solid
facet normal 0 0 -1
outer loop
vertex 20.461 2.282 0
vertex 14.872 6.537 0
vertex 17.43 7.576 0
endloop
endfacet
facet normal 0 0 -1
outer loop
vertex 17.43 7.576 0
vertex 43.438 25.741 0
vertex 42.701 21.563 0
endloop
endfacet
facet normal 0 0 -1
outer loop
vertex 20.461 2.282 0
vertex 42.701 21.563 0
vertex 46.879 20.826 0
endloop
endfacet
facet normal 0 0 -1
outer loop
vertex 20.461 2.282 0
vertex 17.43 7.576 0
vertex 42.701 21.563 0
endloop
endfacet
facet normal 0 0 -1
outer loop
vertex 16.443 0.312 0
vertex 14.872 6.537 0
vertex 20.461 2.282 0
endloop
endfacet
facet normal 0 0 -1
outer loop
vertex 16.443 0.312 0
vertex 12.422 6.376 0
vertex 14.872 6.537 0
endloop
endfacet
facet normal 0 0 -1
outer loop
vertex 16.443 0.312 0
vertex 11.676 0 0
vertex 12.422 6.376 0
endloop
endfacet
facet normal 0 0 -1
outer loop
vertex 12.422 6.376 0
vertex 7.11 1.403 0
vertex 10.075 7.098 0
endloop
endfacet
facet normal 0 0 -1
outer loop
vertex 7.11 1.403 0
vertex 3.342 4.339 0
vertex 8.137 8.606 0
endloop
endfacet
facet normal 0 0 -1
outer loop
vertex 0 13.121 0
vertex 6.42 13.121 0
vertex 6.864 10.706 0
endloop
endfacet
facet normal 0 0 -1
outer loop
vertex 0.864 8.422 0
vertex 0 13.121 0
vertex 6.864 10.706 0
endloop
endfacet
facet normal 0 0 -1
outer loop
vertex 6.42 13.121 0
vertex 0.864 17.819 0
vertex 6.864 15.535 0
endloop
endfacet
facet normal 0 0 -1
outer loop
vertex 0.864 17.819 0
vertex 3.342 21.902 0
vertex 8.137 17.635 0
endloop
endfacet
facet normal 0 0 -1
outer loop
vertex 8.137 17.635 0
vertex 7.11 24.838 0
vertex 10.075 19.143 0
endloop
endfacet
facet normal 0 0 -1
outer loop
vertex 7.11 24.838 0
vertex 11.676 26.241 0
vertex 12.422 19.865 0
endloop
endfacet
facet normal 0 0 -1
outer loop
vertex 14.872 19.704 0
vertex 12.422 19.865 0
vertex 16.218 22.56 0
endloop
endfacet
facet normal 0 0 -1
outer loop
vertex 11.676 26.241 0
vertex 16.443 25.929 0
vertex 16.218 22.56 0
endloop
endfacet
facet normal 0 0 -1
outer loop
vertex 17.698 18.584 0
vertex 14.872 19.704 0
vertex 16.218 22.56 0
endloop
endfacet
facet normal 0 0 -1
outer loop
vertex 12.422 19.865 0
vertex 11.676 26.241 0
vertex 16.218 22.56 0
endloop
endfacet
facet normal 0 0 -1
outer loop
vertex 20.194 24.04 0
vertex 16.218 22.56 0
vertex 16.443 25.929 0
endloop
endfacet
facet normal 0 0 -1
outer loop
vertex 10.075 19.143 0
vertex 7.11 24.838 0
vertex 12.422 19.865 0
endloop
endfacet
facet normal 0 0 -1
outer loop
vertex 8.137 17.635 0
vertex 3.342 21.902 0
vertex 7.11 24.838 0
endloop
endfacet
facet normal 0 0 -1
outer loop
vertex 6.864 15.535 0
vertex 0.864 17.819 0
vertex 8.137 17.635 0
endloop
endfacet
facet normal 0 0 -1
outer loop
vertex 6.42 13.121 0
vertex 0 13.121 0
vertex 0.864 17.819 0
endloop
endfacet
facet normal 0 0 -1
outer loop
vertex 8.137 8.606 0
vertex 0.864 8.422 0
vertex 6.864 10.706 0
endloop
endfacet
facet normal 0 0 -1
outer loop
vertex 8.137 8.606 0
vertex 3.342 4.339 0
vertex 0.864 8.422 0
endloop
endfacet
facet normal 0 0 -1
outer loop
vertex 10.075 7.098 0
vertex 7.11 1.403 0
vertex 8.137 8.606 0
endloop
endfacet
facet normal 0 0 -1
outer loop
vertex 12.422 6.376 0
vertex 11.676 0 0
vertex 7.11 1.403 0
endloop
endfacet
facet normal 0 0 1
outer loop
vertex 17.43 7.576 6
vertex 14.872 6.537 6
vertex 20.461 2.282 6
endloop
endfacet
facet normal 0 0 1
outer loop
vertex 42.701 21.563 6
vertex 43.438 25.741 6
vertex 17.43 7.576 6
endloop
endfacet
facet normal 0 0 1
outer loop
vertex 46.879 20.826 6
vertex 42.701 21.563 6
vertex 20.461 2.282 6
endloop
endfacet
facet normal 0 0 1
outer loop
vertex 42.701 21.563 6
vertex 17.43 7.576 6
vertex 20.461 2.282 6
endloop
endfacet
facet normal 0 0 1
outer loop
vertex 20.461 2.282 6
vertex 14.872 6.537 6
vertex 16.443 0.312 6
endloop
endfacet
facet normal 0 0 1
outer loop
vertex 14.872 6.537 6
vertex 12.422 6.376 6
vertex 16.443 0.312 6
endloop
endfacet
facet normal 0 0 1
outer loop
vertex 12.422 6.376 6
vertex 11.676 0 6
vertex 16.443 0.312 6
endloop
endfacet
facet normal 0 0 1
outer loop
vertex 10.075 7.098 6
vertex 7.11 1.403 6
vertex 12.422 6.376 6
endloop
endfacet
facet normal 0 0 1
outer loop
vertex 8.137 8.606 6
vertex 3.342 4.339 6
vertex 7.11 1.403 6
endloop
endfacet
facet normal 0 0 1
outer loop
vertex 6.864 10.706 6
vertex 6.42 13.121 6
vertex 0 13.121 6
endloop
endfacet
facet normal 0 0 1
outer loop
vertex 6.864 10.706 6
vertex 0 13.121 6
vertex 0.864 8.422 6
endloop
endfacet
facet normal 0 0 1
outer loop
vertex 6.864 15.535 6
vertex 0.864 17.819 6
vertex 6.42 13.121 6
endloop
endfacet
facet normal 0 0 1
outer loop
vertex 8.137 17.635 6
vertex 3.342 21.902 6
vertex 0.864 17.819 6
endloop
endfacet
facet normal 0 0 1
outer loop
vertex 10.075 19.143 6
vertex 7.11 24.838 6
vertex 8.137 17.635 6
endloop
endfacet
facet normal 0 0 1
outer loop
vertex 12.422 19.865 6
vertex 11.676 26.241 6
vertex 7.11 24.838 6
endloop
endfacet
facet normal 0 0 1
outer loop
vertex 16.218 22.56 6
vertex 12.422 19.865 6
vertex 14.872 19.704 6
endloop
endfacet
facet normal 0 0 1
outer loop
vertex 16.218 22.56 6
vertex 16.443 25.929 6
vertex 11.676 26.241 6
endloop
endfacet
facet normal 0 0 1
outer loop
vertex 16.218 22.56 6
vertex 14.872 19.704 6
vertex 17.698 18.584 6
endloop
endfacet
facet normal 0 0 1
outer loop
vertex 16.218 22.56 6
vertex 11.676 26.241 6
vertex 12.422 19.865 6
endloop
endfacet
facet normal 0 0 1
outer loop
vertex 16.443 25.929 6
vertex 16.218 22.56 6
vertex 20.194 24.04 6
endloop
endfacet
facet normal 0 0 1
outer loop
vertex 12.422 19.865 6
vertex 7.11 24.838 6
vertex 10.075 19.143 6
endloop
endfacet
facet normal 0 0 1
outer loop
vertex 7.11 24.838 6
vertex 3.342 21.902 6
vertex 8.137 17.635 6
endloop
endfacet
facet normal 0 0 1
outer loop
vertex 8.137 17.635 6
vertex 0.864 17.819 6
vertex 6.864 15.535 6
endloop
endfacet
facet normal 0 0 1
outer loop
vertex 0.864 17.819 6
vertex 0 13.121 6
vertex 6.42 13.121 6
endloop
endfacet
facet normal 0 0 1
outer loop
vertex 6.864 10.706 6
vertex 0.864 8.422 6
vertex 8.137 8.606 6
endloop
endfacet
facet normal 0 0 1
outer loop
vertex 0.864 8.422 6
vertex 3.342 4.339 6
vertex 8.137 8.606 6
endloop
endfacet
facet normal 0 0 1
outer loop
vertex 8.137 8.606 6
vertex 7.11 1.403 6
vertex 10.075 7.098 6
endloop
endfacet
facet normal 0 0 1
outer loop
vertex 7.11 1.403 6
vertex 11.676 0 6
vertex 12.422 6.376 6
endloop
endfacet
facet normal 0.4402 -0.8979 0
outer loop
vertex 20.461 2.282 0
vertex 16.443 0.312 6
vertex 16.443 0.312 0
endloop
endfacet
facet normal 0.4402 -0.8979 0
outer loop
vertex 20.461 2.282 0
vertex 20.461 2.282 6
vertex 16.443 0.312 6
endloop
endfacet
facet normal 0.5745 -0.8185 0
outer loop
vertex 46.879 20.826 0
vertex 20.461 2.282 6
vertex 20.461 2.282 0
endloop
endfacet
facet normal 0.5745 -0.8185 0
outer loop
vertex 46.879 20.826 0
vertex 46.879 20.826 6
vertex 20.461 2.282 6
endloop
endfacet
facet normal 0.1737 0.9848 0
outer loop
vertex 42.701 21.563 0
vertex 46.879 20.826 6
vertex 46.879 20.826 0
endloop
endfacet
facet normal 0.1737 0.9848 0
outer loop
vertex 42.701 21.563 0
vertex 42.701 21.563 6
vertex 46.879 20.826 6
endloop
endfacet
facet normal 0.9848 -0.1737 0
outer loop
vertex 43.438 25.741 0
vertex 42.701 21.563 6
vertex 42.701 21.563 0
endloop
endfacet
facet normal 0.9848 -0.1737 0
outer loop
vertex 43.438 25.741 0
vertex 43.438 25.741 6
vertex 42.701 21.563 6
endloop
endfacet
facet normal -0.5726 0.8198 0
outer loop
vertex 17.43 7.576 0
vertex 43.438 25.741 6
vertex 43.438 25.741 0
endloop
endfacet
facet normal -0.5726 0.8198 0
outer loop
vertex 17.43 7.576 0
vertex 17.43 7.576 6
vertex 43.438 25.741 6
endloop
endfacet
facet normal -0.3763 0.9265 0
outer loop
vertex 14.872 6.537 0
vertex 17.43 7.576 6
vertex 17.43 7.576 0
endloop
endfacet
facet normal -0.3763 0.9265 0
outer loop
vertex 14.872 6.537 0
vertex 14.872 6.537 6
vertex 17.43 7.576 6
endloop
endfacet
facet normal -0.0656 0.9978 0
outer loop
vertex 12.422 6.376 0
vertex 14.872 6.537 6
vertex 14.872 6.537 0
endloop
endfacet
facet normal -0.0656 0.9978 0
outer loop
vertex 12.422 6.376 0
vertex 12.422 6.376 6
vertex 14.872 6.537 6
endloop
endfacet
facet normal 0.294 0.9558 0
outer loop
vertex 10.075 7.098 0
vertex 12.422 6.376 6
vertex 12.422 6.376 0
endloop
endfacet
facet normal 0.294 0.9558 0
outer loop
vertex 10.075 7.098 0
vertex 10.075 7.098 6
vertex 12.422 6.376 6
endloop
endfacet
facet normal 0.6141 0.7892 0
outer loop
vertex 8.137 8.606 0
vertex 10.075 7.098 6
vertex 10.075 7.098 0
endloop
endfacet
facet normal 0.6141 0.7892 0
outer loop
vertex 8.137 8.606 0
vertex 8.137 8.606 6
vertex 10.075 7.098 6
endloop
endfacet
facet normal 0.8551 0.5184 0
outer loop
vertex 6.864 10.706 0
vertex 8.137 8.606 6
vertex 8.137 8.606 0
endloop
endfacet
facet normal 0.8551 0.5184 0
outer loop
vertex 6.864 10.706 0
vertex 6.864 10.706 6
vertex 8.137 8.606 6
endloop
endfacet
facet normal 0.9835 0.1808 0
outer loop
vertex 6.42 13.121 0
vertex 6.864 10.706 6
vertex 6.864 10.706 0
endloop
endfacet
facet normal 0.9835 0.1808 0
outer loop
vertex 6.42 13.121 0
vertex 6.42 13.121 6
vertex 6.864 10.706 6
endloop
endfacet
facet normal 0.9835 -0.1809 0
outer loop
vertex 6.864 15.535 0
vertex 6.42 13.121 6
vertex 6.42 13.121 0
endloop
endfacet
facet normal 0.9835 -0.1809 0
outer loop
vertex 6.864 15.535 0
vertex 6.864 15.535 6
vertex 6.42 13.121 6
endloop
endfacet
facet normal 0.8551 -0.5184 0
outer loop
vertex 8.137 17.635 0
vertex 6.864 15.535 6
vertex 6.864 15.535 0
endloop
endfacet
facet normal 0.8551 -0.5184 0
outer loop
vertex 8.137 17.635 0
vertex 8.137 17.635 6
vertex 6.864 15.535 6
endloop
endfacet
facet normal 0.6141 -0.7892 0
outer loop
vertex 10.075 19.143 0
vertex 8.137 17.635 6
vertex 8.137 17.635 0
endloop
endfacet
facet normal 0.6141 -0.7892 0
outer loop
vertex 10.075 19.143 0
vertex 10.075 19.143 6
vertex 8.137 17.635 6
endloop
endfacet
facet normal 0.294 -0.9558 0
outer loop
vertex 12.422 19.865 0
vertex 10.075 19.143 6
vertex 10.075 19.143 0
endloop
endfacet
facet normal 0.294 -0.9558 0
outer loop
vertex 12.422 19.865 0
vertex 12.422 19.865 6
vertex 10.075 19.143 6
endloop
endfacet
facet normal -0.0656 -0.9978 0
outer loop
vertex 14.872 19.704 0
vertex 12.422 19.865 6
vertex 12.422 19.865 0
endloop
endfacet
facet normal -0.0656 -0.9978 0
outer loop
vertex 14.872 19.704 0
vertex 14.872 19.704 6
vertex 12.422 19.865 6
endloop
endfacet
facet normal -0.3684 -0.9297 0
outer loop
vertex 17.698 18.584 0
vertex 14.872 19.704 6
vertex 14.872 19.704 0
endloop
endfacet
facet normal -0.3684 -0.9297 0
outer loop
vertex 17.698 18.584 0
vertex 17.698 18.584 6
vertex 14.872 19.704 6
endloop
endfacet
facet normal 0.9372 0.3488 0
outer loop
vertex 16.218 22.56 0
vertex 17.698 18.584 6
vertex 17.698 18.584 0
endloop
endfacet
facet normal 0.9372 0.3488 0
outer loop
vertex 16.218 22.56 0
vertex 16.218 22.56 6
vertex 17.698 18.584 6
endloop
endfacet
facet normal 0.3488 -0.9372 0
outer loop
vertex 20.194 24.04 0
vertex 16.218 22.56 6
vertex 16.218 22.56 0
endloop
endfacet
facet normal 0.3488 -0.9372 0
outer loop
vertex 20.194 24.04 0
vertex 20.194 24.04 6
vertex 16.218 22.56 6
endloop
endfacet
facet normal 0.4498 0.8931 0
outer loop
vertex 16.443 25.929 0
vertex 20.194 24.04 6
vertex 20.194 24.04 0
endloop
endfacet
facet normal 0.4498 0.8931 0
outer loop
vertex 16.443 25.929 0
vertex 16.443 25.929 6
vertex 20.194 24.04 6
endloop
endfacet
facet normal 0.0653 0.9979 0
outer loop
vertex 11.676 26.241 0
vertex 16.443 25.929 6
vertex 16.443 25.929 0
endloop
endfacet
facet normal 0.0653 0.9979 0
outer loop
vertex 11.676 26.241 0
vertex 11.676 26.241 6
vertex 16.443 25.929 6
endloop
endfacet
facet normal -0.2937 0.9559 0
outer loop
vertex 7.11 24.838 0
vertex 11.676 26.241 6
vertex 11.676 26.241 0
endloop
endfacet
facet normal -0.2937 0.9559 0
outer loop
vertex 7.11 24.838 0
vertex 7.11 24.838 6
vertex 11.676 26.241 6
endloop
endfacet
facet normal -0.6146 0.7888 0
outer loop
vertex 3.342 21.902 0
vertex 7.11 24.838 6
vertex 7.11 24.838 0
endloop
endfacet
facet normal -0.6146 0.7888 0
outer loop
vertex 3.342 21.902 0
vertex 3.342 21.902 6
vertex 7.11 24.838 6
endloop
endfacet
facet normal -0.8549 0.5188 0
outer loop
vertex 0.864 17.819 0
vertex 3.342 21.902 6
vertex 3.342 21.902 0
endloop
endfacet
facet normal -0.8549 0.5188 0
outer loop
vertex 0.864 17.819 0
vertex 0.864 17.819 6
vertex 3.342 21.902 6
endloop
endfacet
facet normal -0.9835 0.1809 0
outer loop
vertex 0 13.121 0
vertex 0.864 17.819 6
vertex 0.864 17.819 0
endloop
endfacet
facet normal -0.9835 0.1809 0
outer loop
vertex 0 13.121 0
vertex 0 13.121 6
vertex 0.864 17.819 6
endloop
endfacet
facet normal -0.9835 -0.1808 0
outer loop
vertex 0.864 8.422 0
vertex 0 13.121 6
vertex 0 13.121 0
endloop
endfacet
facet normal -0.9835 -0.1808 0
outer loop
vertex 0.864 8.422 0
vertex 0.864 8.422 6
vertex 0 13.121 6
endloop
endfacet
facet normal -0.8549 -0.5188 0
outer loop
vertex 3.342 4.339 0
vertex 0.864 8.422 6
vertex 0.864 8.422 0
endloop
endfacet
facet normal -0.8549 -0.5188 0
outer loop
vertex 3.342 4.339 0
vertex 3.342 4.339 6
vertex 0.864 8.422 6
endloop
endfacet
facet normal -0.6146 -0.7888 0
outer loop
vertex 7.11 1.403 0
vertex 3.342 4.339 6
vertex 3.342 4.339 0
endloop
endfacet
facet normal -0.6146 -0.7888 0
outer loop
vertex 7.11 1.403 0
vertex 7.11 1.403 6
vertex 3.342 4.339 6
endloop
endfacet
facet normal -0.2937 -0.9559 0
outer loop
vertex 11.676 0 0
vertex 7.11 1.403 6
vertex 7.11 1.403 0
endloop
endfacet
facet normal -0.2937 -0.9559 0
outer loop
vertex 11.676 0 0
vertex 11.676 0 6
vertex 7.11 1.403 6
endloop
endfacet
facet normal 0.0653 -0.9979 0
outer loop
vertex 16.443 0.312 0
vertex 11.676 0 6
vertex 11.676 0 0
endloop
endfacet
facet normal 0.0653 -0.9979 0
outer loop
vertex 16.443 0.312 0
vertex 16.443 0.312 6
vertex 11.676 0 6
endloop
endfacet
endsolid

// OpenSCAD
$fn = 32;

// ----------------------------------------------------------------------
// Eye lug: ring_tail, 6 mm thick
// ----------------------------------------------------------------------

// --- parameters (mm) ---
profile_height = 6;       // extrusion height
profile_points = 30;      // points of the closed outline

profile = [[16.218, 22.56], [20.194, 24.04], [16.443, 25.929], [11.676, 26.241], [7.11, 24.838], [3.342, 21.902], [0.864, 17.819], [0, 13.121], [0.864, 8.422], [3.342, 4.339], [7.11, 1.403], [11.676, 0], [16.443, 0.312], [20.461, 2.282], [46.879, 20.826], [42.701, 21.563], [43.438, 25.741], [17.43, 7.576], [14.872, 6.537], [12.422, 6.376], [10.075, 7.098], [8.137, 8.606], [6.864, 10.706], [6.42, 13.121], [6.864, 15.535], [8.137, 17.635], [10.075, 19.143], [12.422, 19.865], [14.872, 19.704], [17.698, 18.584]];  // single closed polygon, 30 points, counter clockwise

// --- the one profile operation ---
linear_extrude(height = profile_height) polygon(points = profile);
